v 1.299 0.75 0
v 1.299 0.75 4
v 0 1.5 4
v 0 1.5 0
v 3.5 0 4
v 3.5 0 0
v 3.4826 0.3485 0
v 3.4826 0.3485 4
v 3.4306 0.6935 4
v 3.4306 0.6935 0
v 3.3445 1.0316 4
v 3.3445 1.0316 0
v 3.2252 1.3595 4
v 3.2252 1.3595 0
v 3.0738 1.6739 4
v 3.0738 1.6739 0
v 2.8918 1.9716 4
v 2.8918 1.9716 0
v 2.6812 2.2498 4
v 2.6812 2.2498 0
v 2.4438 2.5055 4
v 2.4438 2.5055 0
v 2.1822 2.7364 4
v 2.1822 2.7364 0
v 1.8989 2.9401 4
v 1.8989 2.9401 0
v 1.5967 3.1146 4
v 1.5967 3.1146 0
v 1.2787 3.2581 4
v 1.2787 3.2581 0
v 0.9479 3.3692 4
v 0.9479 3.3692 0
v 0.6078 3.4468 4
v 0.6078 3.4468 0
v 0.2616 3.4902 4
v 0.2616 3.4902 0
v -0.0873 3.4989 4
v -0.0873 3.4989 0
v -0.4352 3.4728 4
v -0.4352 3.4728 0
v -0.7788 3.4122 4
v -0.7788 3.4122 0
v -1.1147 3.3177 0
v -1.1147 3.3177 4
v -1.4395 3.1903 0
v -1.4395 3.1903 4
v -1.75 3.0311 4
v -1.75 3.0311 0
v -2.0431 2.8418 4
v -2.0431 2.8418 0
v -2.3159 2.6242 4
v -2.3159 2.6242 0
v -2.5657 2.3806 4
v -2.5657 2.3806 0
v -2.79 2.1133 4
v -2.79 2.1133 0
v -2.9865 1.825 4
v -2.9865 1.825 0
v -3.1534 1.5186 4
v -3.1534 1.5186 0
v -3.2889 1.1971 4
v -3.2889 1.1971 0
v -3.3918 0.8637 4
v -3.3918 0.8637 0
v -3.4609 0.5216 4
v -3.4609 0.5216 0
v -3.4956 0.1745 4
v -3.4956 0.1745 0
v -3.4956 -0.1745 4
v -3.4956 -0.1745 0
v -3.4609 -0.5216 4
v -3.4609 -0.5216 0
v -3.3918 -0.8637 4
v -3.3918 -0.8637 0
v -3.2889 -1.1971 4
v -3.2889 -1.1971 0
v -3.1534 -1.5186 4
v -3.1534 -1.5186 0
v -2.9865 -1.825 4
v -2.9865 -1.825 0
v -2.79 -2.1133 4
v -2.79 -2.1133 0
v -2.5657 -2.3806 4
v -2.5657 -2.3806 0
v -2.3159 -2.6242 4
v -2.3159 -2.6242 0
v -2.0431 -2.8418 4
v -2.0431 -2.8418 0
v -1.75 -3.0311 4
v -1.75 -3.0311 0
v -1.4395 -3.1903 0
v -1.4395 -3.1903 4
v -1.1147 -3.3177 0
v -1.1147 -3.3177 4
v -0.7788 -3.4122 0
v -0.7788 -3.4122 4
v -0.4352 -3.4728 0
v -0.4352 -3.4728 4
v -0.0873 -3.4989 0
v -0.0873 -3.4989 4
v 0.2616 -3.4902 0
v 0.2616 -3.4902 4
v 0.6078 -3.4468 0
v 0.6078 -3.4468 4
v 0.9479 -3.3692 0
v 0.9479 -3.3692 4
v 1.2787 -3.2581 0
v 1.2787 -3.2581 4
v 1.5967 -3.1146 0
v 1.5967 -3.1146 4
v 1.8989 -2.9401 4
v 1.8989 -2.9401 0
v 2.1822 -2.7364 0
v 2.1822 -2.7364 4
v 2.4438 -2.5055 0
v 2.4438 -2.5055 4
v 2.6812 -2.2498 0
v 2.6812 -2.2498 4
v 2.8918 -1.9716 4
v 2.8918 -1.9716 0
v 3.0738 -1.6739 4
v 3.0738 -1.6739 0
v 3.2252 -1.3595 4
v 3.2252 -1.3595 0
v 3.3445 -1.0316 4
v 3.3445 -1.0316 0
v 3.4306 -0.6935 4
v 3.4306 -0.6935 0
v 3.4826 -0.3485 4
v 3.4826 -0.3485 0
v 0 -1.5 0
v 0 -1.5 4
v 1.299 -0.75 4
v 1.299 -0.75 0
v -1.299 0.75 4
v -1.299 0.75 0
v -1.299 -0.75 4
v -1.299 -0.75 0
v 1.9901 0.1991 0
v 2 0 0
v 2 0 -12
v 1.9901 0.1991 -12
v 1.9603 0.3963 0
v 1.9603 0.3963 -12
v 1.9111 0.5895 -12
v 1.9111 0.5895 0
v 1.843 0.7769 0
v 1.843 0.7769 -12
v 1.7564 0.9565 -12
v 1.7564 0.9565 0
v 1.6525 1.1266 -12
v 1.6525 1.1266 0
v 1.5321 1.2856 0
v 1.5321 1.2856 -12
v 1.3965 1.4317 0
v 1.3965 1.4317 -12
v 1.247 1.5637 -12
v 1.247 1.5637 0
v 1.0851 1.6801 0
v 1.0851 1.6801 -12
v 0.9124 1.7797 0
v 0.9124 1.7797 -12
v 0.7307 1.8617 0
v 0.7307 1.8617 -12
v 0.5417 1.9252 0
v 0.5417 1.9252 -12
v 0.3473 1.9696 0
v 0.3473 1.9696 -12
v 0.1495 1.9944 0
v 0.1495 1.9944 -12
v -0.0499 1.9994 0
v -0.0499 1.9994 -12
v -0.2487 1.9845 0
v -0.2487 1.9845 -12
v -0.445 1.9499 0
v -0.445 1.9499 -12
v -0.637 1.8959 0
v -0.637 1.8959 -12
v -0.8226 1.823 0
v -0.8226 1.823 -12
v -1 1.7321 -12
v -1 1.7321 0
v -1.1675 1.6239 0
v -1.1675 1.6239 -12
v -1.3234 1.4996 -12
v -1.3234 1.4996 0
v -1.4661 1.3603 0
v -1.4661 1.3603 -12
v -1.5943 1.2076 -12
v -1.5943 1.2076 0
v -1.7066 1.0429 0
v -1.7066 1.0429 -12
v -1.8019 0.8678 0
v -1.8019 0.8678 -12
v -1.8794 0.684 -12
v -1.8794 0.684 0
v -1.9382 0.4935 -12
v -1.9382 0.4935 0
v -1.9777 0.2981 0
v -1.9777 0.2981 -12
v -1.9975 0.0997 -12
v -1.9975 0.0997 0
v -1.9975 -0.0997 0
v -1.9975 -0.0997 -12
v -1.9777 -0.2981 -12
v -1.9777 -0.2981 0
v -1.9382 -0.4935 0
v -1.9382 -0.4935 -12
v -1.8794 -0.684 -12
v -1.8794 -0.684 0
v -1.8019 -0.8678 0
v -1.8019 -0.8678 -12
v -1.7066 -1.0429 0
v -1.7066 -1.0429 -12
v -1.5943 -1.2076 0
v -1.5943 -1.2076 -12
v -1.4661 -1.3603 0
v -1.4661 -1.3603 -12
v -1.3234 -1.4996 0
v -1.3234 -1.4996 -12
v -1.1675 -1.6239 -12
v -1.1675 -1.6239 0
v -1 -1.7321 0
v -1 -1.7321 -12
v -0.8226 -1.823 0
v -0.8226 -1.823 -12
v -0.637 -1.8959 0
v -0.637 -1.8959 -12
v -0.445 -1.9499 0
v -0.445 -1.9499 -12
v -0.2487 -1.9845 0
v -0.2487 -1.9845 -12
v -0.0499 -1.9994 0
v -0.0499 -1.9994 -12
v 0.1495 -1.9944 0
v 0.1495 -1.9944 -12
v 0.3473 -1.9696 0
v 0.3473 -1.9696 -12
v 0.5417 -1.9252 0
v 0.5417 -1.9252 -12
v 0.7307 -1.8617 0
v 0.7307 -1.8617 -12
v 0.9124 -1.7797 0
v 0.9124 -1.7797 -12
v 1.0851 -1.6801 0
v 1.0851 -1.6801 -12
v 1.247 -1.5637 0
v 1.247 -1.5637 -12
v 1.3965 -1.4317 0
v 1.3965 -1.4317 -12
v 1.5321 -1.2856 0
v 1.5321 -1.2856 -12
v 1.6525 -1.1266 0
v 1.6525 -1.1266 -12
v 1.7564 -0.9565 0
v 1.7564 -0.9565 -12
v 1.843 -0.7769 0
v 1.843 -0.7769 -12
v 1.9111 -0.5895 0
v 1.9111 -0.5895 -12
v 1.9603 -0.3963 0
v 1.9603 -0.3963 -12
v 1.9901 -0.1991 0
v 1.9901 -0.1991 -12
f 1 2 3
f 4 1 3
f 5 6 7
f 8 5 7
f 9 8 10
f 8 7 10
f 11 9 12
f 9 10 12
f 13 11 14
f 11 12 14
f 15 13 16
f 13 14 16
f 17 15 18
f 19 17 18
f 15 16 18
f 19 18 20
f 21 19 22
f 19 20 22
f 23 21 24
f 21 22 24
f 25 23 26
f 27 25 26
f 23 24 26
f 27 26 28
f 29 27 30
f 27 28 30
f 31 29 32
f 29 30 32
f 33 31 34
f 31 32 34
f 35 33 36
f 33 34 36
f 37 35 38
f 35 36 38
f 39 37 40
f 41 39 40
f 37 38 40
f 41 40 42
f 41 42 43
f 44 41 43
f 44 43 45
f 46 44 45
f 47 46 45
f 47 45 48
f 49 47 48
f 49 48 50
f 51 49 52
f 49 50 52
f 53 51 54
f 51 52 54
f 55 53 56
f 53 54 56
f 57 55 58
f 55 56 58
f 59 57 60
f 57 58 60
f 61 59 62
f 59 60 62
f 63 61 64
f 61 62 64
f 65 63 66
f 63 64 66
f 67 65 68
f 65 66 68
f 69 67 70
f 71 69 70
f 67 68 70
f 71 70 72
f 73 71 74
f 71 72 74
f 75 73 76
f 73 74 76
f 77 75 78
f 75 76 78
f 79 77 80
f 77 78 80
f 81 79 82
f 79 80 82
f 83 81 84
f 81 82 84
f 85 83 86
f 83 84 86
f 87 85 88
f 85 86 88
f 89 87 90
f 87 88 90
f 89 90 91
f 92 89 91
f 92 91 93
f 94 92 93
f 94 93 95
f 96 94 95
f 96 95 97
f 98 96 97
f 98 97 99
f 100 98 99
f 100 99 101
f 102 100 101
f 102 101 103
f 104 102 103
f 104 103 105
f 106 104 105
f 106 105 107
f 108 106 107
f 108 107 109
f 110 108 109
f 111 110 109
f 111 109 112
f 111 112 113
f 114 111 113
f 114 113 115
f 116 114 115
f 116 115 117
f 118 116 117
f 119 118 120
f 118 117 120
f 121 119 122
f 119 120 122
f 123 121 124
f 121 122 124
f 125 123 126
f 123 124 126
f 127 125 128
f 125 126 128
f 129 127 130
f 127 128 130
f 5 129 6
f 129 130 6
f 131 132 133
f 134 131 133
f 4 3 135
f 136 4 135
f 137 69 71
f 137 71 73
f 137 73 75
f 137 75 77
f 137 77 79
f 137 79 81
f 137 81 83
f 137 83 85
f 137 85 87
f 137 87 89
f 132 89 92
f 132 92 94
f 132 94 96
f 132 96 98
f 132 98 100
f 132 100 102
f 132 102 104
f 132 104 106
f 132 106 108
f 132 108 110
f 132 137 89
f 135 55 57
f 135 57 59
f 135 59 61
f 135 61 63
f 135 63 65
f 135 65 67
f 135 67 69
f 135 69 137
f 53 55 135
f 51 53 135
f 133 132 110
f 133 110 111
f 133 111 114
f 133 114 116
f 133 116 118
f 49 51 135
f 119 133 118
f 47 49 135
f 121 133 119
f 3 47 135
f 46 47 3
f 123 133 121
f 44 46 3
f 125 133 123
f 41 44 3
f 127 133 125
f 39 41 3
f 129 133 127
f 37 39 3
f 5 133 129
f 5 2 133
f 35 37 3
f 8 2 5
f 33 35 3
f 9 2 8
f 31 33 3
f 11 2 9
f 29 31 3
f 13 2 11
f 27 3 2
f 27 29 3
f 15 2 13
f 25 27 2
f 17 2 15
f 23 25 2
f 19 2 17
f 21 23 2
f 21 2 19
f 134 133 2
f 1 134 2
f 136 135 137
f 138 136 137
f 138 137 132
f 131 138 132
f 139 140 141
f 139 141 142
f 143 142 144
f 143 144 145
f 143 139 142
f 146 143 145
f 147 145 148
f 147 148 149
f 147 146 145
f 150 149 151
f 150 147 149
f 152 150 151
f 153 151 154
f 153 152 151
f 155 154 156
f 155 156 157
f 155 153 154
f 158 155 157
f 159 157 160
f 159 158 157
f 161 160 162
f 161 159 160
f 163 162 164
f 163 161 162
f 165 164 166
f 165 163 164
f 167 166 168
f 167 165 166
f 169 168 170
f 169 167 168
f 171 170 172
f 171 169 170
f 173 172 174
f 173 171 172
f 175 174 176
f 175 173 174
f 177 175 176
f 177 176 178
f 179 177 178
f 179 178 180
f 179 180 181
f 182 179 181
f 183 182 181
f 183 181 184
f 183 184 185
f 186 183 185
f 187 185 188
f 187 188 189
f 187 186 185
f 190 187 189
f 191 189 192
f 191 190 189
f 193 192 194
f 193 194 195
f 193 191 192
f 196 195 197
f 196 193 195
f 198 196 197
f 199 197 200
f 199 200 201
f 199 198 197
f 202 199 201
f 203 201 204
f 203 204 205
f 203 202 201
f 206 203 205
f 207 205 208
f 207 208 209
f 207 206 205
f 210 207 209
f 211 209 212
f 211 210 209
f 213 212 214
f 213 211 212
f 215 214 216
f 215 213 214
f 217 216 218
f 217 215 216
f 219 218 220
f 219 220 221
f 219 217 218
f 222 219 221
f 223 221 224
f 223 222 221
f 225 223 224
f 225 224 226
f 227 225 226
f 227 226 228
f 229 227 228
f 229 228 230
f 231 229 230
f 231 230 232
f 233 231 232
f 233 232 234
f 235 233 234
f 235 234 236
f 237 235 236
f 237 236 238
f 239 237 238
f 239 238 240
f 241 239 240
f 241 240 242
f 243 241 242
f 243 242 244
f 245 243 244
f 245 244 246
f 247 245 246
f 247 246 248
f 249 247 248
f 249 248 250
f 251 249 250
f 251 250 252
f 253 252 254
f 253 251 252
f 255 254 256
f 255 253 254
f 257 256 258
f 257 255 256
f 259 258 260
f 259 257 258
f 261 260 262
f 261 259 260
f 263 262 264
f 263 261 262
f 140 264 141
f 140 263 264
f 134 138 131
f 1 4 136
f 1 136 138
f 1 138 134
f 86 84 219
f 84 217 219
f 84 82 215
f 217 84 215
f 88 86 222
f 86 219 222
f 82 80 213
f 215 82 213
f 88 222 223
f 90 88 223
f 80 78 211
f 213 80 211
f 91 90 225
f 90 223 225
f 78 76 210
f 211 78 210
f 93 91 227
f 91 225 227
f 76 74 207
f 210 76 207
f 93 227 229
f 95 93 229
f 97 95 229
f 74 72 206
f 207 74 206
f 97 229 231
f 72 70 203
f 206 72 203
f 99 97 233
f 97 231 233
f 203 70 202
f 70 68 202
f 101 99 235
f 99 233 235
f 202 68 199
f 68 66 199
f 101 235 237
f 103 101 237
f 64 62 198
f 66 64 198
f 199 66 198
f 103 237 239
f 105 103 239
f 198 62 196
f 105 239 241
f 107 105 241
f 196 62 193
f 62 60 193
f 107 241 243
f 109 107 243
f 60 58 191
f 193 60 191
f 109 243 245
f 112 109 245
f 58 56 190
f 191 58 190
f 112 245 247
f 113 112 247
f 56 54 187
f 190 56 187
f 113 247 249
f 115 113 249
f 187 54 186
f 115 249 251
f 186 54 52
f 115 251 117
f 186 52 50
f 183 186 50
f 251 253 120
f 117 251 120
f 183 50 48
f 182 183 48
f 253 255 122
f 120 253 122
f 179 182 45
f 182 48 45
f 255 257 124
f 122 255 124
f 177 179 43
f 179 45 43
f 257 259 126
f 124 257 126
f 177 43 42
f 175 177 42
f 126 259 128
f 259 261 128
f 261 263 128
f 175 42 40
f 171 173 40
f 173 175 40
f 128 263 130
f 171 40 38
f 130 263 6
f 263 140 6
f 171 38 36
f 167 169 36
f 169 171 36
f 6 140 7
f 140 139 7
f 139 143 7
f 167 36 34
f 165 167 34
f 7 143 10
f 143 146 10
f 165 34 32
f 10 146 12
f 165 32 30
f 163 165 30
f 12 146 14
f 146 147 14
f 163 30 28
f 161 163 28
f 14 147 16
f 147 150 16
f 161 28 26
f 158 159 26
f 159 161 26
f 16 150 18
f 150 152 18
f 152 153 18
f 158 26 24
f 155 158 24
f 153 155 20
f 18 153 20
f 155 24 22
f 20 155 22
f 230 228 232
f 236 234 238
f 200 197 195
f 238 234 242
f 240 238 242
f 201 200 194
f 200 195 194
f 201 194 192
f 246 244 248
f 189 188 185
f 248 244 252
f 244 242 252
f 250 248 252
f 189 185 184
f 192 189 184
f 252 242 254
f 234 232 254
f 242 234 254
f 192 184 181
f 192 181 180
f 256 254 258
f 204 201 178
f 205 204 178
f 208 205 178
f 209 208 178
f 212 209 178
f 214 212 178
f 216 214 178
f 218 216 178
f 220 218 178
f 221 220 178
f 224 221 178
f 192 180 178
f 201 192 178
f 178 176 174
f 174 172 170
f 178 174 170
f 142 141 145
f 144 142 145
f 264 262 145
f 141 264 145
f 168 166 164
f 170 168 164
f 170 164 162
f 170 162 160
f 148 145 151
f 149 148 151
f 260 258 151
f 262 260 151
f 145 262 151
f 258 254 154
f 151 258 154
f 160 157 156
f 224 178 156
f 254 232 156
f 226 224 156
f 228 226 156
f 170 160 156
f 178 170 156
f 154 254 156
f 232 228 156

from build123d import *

# Parameters (mm, degrees)
F0_R     = 3.5
F0_R_2   = 2
F1_DEPTH = 4
F2_DEPTH = 12
F4_DEPTH = 4


with BuildPart() as f1:
    # F0 (on Top) → F1 (new body)
    with BuildSketch(Plane.XY):
        Circle(F0_R)
        Circle(F0_R_2, mode=Mode.SUBTRACT)
        Circle(F0_R_2)
    extrude(amount=F1_DEPTH)

    # F0 (on Top) → F2 (join)
    with BuildSketch(Plane.XY):
        Circle(F0_R_2)
    extrude(amount=-F2_DEPTH)

    # F3 (on face) → F4 (cut, through all)
    with BuildSketch(Plane.XY.offset(4)):
        Polygon((-1.299038, -0.75), (0, -1.5), (1.299038, -0.75), (1.299038, 0.75), (0, 1.5), (-1.299038, 0.75), align=None)
    extrude(amount=-F4_DEPTH, mode=Mode.SUBTRACT)


solid = f1.part
